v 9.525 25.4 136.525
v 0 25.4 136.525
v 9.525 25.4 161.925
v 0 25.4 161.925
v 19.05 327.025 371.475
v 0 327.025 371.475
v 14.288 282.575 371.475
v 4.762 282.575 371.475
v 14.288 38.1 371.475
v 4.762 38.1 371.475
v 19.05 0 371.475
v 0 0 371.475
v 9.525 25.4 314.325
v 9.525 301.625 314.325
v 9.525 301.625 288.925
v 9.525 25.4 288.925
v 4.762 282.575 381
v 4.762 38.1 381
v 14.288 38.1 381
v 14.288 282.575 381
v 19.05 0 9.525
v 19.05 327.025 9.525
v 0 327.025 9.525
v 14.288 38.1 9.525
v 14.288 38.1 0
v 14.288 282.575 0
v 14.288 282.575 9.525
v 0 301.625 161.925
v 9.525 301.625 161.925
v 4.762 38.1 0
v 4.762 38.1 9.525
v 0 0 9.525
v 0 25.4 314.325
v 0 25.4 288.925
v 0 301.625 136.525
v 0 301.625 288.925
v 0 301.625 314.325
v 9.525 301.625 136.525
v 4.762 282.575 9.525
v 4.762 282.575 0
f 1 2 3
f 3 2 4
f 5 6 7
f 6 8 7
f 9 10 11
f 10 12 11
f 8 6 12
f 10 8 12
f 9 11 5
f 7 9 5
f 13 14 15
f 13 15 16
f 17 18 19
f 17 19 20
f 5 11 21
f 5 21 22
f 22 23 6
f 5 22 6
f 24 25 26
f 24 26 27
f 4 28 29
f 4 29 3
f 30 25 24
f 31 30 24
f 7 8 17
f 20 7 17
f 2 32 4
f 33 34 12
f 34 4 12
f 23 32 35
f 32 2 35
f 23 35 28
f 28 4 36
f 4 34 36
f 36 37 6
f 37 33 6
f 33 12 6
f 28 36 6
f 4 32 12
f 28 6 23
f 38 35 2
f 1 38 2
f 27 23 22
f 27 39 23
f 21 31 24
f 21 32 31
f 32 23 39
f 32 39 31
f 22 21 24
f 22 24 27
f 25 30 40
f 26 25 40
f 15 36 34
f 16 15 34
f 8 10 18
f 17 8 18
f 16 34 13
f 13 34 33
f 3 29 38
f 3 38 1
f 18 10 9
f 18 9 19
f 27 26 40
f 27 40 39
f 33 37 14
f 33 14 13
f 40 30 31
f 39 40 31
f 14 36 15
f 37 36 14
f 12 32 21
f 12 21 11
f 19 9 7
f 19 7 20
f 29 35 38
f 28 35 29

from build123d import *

# Parameters (mm, degrees)
F0_W     = 327.025
F0_H     = 381
F1_DEPTH = 19.05
F2_W     = 4.7625
F2_H     = 9.525
F3_DEPTH = 327.025
F4_W     = 38.1
F4_H     = 9.525
F4_W_2   = 44.45
F5_DEPTH = 9.525
F6_W     = 276.225
F6_H     = 25.4
F7_DEPTH = 9.525


with BuildPart() as f1:
    # F0 (on Right) → F1 (new body)
    with BuildSketch(Plane.YZ):
        with Locations((163.5125, 190.5)):
            Rectangle(F0_W, F0_H)
    extrude(amount=F1_DEPTH)

    # F2 (on Front) → F3 (cut, through all)
    with BuildSketch(Plane.XZ):
        with Locations((2.38125, 376.2375)):
            Rectangle(F2_W, F2_H)
        with Locations((16.66875, 376.2375)):
            Rectangle(F2_W, F2_H)
        with Locations((2.38125, 4.7625)):
            Rectangle(F2_W, F2_H)
        with Locations((16.66875, 4.7625)):
            Rectangle(F2_W, F2_H)
    extrude(amount=-F3_DEPTH, mode=Mode.SUBTRACT)

    # F4 (on face) → F5 (cut, through all)
    with BuildSketch(Plane.YZ.offset(14.2875)):
        with Locations((19.05, 376.2375)):
            Rectangle(F4_W, F4_H)
        with Locations((19.05, 4.7625)):
            Rectangle(F4_W, F4_H)
        with Locations((304.8, 376.2375)):
            Rectangle(F4_W_2, F4_H)
        with Locations((304.8, 4.7625)):
            Rectangle(F4_W_2, F4_H)
    extrude(amount=-F5_DEPTH, mode=Mode.SUBTRACT)

    # F6 (on face) → F7 (cut)
    with BuildSketch(Plane(origin=(0, 0, 0), x_dir=(0, -1, 0), z_dir=(-1, 0, 0))):
        with Locations((-163.5125, 301.625)):
            Rectangle(F6_W, F6_H)
        with Locations((-163.5125, 149.225)):
            Rectangle(F6_W, F6_H)
    extrude(amount=-F7_DEPTH, mode=Mode.SUBTRACT)


solid = f1.part
